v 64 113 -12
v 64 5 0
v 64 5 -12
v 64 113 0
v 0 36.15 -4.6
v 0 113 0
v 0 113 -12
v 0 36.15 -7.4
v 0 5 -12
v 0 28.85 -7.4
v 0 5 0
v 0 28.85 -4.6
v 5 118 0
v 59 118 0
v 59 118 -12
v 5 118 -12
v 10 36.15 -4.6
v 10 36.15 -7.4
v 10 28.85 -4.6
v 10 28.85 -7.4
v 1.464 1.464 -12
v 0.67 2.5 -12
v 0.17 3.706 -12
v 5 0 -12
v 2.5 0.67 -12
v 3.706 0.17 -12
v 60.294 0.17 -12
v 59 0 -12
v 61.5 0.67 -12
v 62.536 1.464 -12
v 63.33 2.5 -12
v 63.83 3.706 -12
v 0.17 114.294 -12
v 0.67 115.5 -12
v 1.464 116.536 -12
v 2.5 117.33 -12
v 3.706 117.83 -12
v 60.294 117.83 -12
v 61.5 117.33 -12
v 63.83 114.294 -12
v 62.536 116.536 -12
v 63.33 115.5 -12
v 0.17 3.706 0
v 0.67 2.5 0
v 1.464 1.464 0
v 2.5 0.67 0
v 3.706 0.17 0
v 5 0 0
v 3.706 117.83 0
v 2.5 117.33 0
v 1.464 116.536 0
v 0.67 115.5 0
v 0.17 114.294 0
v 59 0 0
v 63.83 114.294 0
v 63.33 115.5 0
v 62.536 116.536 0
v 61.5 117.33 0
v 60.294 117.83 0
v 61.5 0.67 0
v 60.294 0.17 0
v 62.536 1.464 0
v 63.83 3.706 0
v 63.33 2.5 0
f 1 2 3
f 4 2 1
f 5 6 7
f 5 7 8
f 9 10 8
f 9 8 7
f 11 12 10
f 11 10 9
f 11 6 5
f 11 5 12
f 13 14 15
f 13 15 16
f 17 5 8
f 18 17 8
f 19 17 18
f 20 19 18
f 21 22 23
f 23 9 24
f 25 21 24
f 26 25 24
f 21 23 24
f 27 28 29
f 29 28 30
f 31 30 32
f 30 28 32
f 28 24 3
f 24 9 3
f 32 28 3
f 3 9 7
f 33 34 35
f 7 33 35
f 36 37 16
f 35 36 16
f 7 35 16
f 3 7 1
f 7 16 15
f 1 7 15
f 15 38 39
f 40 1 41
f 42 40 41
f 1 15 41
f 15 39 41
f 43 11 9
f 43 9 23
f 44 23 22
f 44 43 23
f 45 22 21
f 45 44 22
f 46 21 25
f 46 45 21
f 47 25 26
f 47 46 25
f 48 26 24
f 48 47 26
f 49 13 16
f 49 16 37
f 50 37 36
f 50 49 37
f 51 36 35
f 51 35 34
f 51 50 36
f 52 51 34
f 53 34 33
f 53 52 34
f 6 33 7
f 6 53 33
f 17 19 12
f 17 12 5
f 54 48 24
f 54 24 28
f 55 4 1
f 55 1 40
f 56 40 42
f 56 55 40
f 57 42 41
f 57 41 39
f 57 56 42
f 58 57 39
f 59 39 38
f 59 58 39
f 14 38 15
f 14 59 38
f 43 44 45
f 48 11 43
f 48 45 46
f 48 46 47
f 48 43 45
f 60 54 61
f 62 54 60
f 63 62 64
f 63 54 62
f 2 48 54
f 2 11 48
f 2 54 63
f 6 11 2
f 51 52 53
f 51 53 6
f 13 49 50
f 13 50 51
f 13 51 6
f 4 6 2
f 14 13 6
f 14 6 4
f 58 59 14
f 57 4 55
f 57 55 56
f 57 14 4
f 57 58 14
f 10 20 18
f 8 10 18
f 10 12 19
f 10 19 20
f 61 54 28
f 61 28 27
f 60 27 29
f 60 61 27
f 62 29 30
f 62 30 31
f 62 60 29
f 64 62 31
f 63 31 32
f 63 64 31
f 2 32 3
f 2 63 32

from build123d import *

# Parameters (mm, degrees)
BOSS_EXTRUDE1_DEPTH = 12
SKETCH2_W           = 2.8
SKETCH2_H           = 7.3
CUT_EXTRUDE1_DEPTH  = 10


with BuildPart() as part:
    # Sketch1 → Boss-Extrude1 (new body)
    with BuildSketch(Plane.XY):
        with BuildLine():
            Line((5, 0), (59, 0))
            ThreePointArc((59, 0), (62.535533906, 1.464466094), (64, 5))
            Line((64, 5), (64, 113))
            ThreePointArc((64, 113), (62.535533906, 116.535533906), (59, 118))
            Line((59, 118), (5, 118))
            ThreePointArc((5, 118), (1.464466094, 116.535533906), (0, 113))
            Line((0, 113), (0, 5))
            ThreePointArc((0, 5), (1.464466094, 1.464466094), (5, 0))
        make_face()
    extrude(amount=-BOSS_EXTRUDE1_DEPTH)

    # Sketch2 → Cut-Extrude1 (cut)
    with BuildSketch(Plane(origin=(0, 0, 0), x_dir=(0, 0, -1), z_dir=(1, 0, 0))):
        with Locations((6, 32.5)):
            Rectangle(SKETCH2_W, SKETCH2_H)
    extrude(amount=CUT_EXTRUDE1_DEPTH, mode=Mode.SUBTRACT)


solid = part.part
